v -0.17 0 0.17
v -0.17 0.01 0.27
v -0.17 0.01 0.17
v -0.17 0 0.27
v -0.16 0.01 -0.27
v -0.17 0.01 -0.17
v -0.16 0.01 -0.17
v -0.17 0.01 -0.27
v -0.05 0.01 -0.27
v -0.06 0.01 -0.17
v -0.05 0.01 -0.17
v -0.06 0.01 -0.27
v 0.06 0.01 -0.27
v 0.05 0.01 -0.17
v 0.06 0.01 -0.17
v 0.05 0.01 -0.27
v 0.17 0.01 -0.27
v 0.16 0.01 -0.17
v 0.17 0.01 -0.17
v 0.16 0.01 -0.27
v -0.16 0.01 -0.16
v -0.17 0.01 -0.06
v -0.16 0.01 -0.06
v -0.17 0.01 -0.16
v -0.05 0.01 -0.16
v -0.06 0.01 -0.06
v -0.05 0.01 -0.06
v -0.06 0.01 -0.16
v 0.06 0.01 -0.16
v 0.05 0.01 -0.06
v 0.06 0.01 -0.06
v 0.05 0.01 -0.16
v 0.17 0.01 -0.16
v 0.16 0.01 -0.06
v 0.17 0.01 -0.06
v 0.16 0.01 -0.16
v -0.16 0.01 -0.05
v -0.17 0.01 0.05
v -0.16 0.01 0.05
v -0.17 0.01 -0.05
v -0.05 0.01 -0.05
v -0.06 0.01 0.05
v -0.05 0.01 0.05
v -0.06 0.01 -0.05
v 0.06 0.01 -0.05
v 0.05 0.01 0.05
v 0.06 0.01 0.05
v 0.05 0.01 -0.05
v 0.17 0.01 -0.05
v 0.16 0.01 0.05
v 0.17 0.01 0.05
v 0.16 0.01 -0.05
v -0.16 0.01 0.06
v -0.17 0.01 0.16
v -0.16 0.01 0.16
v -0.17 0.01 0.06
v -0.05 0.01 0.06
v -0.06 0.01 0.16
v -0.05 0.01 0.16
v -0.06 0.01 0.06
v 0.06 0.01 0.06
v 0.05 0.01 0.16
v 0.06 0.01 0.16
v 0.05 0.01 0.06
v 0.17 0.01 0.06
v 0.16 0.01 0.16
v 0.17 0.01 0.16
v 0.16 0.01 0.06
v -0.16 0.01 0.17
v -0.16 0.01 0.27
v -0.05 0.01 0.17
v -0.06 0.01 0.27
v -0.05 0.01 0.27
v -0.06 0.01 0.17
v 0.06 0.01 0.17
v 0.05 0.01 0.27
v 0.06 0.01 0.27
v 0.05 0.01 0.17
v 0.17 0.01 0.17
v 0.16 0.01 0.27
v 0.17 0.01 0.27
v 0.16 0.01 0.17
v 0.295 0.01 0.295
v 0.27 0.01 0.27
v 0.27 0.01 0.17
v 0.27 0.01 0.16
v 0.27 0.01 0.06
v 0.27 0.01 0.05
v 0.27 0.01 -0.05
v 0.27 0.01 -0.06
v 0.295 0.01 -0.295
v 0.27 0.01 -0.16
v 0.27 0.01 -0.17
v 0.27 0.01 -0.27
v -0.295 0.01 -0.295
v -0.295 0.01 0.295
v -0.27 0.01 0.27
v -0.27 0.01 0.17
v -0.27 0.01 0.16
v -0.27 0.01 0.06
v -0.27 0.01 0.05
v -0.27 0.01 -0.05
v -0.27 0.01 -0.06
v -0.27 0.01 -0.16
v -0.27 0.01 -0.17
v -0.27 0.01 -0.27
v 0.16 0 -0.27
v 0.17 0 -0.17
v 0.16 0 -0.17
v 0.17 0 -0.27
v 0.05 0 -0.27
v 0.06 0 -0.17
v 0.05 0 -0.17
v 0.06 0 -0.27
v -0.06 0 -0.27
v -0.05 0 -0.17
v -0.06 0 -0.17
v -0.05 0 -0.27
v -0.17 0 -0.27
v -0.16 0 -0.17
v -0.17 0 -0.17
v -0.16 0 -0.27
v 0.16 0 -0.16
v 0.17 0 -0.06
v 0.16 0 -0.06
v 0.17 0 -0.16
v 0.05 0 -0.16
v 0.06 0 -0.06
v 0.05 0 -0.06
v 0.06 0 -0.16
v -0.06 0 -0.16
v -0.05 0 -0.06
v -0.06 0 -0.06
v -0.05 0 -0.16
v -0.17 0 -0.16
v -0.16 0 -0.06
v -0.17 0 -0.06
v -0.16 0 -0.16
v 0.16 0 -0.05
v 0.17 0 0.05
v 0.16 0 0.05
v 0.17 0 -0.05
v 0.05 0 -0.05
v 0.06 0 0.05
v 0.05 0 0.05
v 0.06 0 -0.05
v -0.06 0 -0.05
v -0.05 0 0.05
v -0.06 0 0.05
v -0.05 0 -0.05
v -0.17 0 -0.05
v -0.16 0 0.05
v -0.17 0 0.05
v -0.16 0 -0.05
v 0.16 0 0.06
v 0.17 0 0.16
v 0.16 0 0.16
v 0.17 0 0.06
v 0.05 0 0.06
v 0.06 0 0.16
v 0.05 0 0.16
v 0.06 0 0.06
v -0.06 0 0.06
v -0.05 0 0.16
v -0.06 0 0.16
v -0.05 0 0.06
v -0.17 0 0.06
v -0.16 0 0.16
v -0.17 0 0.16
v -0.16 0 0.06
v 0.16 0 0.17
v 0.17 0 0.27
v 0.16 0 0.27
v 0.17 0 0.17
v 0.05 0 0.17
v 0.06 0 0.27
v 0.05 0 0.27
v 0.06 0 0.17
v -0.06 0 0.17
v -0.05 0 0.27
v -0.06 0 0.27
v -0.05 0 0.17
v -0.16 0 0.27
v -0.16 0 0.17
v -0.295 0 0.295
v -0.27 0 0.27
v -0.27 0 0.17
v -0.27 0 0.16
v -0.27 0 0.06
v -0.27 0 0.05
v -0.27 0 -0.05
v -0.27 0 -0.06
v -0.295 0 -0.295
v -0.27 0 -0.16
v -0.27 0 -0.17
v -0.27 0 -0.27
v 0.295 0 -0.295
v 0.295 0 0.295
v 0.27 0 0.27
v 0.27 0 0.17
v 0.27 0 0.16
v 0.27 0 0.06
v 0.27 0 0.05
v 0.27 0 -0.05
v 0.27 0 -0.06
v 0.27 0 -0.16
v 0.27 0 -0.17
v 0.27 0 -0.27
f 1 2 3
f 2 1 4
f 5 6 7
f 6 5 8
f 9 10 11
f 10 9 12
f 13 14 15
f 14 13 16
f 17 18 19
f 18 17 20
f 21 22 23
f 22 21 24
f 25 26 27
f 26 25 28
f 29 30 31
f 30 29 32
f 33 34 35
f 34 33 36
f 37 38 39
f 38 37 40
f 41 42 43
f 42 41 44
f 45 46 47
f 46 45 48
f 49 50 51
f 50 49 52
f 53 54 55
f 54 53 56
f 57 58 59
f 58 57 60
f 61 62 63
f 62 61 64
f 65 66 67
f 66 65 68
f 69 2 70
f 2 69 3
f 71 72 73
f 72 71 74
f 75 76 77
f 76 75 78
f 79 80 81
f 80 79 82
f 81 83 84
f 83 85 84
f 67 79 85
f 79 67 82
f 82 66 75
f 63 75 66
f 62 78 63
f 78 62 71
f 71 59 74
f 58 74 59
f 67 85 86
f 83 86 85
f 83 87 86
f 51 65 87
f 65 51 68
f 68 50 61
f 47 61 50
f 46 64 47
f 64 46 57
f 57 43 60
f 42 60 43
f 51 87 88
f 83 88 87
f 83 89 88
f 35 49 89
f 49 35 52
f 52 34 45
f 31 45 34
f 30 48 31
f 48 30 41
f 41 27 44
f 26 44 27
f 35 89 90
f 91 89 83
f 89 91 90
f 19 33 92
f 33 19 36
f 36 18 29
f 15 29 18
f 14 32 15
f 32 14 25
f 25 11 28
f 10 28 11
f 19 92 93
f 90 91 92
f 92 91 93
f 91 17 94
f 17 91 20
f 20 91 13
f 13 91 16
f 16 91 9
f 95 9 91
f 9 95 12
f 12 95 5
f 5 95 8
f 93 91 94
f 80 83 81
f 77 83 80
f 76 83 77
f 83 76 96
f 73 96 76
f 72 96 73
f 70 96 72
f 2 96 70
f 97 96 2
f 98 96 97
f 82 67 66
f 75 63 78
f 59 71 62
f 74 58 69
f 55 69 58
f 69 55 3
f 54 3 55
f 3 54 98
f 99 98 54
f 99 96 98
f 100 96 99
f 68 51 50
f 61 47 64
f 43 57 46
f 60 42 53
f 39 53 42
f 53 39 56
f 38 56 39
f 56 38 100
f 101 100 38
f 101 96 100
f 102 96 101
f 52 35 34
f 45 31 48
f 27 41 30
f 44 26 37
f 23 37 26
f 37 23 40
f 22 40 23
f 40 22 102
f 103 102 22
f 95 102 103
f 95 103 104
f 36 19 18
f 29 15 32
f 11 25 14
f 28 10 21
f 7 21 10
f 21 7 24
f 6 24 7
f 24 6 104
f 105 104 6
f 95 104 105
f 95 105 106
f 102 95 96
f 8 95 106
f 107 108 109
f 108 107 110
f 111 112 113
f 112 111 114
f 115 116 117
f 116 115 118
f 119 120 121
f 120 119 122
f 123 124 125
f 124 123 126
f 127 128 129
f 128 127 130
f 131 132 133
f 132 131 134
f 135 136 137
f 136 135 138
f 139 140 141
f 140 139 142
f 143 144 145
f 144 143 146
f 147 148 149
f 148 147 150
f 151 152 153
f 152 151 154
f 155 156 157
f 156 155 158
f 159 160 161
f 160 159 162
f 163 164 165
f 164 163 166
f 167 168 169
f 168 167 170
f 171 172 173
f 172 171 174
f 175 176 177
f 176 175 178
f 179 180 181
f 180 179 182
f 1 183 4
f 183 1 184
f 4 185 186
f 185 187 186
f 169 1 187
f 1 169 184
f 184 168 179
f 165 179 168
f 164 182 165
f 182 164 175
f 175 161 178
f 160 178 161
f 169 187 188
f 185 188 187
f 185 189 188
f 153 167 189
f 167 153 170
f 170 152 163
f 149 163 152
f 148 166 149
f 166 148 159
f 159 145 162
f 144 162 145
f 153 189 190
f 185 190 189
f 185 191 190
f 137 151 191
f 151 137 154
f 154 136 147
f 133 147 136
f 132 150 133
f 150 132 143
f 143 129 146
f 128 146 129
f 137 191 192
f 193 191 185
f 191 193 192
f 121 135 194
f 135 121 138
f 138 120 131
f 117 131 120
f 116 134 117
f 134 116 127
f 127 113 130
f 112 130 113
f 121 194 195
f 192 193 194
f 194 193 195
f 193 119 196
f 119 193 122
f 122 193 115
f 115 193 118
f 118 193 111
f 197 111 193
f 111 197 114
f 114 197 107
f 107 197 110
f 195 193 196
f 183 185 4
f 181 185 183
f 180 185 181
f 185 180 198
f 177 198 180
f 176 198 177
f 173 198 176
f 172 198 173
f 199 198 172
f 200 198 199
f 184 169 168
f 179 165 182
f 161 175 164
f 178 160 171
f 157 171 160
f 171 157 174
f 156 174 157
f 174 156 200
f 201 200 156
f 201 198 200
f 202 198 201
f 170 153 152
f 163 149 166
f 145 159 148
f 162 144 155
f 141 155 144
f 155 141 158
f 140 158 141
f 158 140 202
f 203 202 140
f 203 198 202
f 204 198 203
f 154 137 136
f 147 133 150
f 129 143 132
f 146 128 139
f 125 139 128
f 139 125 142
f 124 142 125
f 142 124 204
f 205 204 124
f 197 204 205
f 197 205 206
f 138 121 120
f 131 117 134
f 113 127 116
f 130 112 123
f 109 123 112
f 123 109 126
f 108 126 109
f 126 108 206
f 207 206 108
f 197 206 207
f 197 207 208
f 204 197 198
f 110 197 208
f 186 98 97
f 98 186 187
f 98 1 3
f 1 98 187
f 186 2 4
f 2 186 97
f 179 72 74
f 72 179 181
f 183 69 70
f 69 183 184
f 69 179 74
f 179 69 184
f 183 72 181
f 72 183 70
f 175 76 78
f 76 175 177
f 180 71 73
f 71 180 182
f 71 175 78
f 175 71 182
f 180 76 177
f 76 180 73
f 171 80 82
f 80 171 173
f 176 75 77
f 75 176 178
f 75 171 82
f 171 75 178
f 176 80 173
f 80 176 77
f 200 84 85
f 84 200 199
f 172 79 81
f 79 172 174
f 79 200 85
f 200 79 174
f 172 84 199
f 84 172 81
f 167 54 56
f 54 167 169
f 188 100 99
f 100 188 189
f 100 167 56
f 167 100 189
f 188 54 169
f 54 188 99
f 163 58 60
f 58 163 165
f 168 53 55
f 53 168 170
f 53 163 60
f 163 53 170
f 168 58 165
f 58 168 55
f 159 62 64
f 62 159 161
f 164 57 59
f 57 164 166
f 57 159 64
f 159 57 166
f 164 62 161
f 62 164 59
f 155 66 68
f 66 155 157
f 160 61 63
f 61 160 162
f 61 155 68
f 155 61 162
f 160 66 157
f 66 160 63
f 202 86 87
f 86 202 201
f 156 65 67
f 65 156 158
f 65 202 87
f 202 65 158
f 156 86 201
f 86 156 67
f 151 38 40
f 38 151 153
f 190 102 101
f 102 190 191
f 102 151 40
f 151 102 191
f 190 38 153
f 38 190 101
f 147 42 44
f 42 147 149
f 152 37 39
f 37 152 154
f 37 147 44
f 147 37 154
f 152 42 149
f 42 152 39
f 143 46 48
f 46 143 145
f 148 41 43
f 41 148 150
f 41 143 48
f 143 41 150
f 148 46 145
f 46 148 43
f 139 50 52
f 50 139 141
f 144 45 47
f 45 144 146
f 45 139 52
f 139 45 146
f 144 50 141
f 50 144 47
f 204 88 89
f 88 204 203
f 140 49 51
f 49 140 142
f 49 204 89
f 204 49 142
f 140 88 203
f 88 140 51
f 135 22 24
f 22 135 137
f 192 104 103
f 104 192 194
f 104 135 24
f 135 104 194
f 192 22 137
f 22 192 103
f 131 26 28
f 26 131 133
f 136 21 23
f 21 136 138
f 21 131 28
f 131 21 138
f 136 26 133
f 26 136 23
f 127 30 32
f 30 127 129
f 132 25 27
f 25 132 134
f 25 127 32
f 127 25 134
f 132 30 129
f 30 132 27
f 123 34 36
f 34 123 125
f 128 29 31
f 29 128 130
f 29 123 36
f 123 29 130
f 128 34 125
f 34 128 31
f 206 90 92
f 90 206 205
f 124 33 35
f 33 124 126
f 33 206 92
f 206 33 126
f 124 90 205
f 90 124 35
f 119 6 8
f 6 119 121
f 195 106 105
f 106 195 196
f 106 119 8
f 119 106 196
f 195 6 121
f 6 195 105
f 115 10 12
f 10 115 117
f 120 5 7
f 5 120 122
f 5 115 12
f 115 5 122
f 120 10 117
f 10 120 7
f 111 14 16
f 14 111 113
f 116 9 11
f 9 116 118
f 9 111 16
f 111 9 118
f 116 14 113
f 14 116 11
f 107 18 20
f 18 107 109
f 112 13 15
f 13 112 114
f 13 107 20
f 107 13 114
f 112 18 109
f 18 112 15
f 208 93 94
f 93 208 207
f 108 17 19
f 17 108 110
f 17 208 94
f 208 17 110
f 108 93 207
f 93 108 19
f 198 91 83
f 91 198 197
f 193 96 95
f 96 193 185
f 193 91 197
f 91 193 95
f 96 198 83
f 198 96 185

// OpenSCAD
// Volcano Board
//
// A slotted board, shaped for Icehouse pieces.
// This is a "deluxe" board, with two separate meshes; a flat bottom part and a
// cutout top part.

width = 5;
height = 5;
render_top_part = true;

rotate([ -90, 0, 0 ]) {
  slot_width = 0.1 * width + 0.01 * (width - 1);
  slot_height = 0.1 * height + 0.01 * (height - 1);
  if (render_top_part) {
    translate([ 0, 0, 0.005 ]) difference() {
      cube([ slot_width + 0.025 * 2, slot_height + 0.025 * 2, 0.01 ],
           center = true);
      for (y = [0:height - 1]) {
        for (x = [0:width - 1]) {
          translate([
            -slot_width / 2 + 0.11 * x + 0.05,
            -slot_height / 2 + 0.11 * y + 0.05, 0
          ]) {
            cube([ 0.1, 0.1, 0.01 ], center = true);
          }
        }
      }
    }
  } else {
    translate([ 0, 0, -0.005 ])
        cube([ slot_width + 0.025 * 2, slot_height + 0.025 * 2, 0.01 ],
             center = true);
  }
}
